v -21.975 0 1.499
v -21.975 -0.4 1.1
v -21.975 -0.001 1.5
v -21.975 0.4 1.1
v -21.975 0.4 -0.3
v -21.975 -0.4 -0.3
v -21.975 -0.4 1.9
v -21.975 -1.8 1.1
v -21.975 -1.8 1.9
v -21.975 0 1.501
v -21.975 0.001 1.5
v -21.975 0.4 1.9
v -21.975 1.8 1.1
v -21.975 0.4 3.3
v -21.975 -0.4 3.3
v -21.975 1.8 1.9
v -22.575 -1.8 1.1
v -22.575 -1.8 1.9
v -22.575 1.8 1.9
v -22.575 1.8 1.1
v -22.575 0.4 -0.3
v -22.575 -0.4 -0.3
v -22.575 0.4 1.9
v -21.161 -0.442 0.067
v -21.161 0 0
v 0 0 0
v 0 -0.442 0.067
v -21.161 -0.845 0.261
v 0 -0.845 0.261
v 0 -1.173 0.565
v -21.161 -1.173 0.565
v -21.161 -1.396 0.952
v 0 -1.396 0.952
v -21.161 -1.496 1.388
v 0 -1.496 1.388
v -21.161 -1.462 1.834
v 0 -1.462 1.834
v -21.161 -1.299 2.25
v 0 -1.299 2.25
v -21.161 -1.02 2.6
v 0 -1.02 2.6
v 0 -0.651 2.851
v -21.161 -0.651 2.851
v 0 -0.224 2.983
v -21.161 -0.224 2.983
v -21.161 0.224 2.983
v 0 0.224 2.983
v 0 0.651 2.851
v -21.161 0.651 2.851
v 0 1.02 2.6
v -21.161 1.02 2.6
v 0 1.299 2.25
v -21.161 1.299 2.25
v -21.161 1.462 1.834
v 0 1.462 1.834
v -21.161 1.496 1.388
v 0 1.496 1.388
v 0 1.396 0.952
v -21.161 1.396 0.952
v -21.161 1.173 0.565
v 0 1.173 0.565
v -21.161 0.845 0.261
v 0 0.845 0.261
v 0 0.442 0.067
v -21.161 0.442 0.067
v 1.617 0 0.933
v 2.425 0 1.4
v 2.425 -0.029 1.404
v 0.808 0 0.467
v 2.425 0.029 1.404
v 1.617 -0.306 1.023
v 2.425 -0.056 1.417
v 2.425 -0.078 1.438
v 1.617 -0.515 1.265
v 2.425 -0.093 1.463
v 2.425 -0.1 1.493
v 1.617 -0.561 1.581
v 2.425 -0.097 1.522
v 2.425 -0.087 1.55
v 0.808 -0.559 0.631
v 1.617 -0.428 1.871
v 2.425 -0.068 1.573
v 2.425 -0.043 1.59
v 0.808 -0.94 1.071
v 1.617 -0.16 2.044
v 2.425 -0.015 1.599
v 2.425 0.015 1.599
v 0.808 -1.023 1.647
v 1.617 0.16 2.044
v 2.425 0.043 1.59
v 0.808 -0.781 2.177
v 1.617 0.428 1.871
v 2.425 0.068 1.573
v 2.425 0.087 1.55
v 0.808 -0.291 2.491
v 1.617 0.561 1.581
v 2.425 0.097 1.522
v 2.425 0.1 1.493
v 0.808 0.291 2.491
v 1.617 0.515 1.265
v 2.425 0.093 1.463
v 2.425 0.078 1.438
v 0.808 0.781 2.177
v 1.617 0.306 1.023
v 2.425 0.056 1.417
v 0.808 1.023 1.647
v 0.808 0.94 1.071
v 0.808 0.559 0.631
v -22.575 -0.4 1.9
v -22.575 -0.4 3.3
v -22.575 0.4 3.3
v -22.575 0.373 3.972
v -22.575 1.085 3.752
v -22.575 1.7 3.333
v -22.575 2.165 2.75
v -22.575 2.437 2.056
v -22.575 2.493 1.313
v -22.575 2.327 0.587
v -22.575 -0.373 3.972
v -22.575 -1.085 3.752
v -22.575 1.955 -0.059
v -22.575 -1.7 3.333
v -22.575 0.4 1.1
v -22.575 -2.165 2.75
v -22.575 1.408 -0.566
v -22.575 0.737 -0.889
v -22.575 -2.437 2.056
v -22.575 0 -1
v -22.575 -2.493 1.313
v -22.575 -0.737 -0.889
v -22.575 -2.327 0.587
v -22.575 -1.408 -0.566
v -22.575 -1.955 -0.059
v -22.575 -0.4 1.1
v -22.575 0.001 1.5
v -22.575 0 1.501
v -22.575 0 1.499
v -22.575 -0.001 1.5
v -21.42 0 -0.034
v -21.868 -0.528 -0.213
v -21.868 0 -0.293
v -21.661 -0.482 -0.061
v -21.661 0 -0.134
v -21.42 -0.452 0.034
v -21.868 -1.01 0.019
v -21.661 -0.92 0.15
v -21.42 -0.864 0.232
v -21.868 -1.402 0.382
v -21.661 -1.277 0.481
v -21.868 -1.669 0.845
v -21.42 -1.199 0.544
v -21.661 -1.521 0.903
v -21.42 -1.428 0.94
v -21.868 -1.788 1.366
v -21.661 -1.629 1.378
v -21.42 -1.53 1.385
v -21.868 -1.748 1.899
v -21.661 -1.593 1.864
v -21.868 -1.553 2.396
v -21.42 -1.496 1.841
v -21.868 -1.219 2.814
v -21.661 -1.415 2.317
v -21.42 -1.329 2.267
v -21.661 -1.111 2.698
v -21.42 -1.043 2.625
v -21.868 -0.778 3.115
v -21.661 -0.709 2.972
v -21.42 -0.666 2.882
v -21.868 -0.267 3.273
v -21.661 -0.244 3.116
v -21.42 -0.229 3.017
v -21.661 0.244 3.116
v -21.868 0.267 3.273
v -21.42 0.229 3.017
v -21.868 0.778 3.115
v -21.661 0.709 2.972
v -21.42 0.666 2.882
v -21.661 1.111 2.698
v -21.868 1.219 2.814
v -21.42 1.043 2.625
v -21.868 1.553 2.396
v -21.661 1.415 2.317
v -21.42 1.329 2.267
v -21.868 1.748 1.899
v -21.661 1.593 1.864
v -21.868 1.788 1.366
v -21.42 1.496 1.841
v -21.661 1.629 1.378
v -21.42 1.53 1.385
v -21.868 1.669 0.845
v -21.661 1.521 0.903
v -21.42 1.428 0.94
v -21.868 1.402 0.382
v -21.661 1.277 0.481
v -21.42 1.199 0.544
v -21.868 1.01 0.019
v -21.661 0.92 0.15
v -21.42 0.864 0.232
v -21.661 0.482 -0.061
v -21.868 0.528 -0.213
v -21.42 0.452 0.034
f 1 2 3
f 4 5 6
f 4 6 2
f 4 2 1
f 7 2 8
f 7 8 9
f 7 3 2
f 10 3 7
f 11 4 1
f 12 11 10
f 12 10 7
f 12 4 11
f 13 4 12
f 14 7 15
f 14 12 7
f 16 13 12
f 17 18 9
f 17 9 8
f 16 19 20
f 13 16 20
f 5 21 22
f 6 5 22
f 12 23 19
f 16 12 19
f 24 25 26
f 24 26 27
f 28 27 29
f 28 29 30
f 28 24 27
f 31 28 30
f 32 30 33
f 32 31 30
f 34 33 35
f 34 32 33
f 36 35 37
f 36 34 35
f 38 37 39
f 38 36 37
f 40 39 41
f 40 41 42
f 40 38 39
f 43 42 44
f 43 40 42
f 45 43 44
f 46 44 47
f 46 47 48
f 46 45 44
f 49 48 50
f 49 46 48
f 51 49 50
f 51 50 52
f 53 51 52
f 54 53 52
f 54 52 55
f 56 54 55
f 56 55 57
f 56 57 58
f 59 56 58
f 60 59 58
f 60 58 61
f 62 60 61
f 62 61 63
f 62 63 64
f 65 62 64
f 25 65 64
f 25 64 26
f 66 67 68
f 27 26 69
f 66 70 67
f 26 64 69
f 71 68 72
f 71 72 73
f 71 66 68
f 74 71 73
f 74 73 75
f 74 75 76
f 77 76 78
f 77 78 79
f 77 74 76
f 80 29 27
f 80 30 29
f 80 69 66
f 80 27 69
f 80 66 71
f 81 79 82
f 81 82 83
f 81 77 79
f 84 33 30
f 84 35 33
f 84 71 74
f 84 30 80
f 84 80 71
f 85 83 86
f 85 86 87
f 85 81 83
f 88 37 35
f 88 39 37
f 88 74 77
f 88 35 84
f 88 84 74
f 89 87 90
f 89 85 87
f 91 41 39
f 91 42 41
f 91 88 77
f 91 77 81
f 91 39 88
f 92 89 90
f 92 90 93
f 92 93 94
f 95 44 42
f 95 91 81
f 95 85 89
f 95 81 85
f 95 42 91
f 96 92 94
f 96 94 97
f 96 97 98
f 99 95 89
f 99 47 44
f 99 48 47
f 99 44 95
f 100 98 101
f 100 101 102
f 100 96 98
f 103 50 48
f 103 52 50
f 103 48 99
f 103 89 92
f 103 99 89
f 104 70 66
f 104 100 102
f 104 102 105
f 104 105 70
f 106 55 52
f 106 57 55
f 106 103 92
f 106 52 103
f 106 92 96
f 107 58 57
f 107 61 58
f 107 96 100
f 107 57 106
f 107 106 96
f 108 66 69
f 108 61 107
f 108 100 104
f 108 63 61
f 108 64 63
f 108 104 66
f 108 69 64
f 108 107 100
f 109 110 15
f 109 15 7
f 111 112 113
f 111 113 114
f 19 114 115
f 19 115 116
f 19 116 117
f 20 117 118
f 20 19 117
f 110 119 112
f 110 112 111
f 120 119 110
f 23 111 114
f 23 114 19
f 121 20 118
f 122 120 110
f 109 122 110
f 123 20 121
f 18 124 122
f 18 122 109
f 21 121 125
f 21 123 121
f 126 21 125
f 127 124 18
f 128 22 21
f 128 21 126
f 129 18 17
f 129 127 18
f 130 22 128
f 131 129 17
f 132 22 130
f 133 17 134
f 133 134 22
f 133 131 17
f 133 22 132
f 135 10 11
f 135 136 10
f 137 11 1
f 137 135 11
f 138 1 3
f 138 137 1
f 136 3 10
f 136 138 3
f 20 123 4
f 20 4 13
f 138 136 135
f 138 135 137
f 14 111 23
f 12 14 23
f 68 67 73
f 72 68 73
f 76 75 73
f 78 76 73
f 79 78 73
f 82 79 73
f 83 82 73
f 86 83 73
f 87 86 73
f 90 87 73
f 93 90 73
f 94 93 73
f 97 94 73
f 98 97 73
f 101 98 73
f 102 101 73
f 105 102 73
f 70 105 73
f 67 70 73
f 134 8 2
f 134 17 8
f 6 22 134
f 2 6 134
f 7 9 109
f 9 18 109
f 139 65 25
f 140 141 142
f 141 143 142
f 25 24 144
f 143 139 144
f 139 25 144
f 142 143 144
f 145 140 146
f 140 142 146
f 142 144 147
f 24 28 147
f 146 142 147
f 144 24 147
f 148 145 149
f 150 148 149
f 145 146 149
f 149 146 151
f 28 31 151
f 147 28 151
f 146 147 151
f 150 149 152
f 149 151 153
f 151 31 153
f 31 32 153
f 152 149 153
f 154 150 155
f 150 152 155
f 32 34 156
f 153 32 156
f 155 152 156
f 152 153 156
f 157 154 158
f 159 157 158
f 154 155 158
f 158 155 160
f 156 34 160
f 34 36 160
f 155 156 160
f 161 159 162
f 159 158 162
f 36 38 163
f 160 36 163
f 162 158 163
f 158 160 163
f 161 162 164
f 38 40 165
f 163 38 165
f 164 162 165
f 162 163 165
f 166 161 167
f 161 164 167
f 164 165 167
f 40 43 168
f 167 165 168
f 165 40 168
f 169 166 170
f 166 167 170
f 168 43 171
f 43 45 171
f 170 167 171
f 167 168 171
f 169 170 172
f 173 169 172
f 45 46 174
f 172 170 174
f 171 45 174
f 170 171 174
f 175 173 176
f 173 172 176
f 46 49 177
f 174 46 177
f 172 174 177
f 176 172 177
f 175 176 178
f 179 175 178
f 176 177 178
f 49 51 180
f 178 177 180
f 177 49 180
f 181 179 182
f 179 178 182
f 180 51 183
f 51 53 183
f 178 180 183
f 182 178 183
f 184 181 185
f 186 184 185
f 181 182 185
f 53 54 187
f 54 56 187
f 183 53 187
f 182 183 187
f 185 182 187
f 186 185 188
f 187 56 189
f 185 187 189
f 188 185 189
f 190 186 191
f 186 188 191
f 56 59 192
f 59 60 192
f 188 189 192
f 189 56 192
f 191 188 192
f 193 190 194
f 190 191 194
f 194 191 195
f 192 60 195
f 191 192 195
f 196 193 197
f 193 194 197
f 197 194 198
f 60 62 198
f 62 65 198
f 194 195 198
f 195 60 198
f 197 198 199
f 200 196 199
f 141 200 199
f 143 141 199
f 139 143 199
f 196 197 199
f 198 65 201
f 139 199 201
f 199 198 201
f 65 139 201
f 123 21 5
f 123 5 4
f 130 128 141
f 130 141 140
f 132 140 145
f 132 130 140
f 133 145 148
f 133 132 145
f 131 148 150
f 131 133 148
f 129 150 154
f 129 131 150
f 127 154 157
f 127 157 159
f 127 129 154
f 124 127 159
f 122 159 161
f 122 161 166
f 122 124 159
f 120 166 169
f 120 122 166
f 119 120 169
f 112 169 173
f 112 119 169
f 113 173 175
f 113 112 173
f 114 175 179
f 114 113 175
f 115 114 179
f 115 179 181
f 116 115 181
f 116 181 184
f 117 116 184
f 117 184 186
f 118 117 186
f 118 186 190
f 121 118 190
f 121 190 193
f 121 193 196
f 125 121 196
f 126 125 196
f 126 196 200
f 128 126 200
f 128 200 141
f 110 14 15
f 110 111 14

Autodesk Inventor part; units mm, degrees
ref_plane "YZ Plane" through (0, 0, 0) normal (1, 0, 0) x (0, 1, 0)
ref_plane "XZ Plane" through (0, 0, 0) normal (0, 1, 0) x (-1, 0, 0)
ref_plane "XY Plane" through (0, 0, 0) normal (0, 0, 1) x (1, 0, 0)
sketch "Skizze1" plane through (0, 0, 0) normal (0, 1, 0) x (-1, 0, 0)
  line L0 (0, 0) -> (21.1609, 0)
  line L1 (0, 0) -> (-2.4249, 1.4)
  line L2 (0, 0) -> (2.8, 0) construction
  line L3 (21.868, -0.2929) -> (22.5751, -1)
  line L4 (-2.4249, 1.4) -> (-2.4249, 1.5)
  line L5 (-2.4249, 1.5) -> (22.5751, 1.5)
  line L6 (22.5751, -1) -> (22.5751, 1.5)
  arc A0 (21.868, -0.2929) -> (21.1609, 0) centre (21.1609, -1) ccw
  point P0 (21.5751, 0)
  dimension "d22" = 0.1
  dimension "d23" = 25
  dimension "d32" = 1
  dimension "d52" = 1.5
  dimension "d53" = 135
  dimension "d54" = 2.5
  dimension "d55" = 30
revolve "Umdrehung1" add sketch "Skizze1" angle 360 about axis through (2.4249, 0, 1.5) along (-1, 0, 0)
thread "Gewinde1" size "R 1/16" standard "ISO Taper" length 21
sketch "Skizze2" plane through (-22.5751, 0, 1.5) normal (-1, 0, 0) x (0, 0, 1)
  circle A0 centre (0, 0) radius 0.0008 projected
  line L0 (0.4, 1.8) -> (-0.4, 1.8)
  line L1 (0.4, -1.8) -> (-0.4, -1.8)
  line L2 (1.8, 0.4) -> (1.8, -0.4)
  line L3 (-1.8, 0.4) -> (-1.8, -0.4)
  line L4 (-1.8, -0.4) -> (-0.4, -0.4)
  line L5 (-1.8, 0.4) -> (-0.4, 0.4)
  line L6 (1.8, 0.4) -> (0.4, 0.4)
  line L7 (1.8, -0.4) -> (0.4, -0.4)
  line L8 (0.4, -1.8) -> (0.4, -0.4)
  line L9 (0.4, 0.4) -> (0.4, 1.8)
  line L10 (-0.4, -1.8) -> (-0.4, -0.4)
  line L11 (-0.4, 0.4) -> (-0.4, 1.8)
  point P0 (-1.5, 0)
  dimension "d48" = 0.8
  dimension "d49" = 0.8
  dimension "d56" = 1.8
  dimension "d57" = 1.8
  dimension "d58" = 1.8
  dimension "d59" = 1.8
  dimension "d61" = 0.8
  dimension "d62" = 0.8
  dimension "d63" = 0.4
  dimension "d64" = 0.4
  dimension "d65" = 0.4
  dimension "d66" = 0.4
extrude "Extrusion2" cut sketch "Skizze2" against normal blind 0.6
properties part number "Wettterstation_Schraube" material "Edelstahl"
